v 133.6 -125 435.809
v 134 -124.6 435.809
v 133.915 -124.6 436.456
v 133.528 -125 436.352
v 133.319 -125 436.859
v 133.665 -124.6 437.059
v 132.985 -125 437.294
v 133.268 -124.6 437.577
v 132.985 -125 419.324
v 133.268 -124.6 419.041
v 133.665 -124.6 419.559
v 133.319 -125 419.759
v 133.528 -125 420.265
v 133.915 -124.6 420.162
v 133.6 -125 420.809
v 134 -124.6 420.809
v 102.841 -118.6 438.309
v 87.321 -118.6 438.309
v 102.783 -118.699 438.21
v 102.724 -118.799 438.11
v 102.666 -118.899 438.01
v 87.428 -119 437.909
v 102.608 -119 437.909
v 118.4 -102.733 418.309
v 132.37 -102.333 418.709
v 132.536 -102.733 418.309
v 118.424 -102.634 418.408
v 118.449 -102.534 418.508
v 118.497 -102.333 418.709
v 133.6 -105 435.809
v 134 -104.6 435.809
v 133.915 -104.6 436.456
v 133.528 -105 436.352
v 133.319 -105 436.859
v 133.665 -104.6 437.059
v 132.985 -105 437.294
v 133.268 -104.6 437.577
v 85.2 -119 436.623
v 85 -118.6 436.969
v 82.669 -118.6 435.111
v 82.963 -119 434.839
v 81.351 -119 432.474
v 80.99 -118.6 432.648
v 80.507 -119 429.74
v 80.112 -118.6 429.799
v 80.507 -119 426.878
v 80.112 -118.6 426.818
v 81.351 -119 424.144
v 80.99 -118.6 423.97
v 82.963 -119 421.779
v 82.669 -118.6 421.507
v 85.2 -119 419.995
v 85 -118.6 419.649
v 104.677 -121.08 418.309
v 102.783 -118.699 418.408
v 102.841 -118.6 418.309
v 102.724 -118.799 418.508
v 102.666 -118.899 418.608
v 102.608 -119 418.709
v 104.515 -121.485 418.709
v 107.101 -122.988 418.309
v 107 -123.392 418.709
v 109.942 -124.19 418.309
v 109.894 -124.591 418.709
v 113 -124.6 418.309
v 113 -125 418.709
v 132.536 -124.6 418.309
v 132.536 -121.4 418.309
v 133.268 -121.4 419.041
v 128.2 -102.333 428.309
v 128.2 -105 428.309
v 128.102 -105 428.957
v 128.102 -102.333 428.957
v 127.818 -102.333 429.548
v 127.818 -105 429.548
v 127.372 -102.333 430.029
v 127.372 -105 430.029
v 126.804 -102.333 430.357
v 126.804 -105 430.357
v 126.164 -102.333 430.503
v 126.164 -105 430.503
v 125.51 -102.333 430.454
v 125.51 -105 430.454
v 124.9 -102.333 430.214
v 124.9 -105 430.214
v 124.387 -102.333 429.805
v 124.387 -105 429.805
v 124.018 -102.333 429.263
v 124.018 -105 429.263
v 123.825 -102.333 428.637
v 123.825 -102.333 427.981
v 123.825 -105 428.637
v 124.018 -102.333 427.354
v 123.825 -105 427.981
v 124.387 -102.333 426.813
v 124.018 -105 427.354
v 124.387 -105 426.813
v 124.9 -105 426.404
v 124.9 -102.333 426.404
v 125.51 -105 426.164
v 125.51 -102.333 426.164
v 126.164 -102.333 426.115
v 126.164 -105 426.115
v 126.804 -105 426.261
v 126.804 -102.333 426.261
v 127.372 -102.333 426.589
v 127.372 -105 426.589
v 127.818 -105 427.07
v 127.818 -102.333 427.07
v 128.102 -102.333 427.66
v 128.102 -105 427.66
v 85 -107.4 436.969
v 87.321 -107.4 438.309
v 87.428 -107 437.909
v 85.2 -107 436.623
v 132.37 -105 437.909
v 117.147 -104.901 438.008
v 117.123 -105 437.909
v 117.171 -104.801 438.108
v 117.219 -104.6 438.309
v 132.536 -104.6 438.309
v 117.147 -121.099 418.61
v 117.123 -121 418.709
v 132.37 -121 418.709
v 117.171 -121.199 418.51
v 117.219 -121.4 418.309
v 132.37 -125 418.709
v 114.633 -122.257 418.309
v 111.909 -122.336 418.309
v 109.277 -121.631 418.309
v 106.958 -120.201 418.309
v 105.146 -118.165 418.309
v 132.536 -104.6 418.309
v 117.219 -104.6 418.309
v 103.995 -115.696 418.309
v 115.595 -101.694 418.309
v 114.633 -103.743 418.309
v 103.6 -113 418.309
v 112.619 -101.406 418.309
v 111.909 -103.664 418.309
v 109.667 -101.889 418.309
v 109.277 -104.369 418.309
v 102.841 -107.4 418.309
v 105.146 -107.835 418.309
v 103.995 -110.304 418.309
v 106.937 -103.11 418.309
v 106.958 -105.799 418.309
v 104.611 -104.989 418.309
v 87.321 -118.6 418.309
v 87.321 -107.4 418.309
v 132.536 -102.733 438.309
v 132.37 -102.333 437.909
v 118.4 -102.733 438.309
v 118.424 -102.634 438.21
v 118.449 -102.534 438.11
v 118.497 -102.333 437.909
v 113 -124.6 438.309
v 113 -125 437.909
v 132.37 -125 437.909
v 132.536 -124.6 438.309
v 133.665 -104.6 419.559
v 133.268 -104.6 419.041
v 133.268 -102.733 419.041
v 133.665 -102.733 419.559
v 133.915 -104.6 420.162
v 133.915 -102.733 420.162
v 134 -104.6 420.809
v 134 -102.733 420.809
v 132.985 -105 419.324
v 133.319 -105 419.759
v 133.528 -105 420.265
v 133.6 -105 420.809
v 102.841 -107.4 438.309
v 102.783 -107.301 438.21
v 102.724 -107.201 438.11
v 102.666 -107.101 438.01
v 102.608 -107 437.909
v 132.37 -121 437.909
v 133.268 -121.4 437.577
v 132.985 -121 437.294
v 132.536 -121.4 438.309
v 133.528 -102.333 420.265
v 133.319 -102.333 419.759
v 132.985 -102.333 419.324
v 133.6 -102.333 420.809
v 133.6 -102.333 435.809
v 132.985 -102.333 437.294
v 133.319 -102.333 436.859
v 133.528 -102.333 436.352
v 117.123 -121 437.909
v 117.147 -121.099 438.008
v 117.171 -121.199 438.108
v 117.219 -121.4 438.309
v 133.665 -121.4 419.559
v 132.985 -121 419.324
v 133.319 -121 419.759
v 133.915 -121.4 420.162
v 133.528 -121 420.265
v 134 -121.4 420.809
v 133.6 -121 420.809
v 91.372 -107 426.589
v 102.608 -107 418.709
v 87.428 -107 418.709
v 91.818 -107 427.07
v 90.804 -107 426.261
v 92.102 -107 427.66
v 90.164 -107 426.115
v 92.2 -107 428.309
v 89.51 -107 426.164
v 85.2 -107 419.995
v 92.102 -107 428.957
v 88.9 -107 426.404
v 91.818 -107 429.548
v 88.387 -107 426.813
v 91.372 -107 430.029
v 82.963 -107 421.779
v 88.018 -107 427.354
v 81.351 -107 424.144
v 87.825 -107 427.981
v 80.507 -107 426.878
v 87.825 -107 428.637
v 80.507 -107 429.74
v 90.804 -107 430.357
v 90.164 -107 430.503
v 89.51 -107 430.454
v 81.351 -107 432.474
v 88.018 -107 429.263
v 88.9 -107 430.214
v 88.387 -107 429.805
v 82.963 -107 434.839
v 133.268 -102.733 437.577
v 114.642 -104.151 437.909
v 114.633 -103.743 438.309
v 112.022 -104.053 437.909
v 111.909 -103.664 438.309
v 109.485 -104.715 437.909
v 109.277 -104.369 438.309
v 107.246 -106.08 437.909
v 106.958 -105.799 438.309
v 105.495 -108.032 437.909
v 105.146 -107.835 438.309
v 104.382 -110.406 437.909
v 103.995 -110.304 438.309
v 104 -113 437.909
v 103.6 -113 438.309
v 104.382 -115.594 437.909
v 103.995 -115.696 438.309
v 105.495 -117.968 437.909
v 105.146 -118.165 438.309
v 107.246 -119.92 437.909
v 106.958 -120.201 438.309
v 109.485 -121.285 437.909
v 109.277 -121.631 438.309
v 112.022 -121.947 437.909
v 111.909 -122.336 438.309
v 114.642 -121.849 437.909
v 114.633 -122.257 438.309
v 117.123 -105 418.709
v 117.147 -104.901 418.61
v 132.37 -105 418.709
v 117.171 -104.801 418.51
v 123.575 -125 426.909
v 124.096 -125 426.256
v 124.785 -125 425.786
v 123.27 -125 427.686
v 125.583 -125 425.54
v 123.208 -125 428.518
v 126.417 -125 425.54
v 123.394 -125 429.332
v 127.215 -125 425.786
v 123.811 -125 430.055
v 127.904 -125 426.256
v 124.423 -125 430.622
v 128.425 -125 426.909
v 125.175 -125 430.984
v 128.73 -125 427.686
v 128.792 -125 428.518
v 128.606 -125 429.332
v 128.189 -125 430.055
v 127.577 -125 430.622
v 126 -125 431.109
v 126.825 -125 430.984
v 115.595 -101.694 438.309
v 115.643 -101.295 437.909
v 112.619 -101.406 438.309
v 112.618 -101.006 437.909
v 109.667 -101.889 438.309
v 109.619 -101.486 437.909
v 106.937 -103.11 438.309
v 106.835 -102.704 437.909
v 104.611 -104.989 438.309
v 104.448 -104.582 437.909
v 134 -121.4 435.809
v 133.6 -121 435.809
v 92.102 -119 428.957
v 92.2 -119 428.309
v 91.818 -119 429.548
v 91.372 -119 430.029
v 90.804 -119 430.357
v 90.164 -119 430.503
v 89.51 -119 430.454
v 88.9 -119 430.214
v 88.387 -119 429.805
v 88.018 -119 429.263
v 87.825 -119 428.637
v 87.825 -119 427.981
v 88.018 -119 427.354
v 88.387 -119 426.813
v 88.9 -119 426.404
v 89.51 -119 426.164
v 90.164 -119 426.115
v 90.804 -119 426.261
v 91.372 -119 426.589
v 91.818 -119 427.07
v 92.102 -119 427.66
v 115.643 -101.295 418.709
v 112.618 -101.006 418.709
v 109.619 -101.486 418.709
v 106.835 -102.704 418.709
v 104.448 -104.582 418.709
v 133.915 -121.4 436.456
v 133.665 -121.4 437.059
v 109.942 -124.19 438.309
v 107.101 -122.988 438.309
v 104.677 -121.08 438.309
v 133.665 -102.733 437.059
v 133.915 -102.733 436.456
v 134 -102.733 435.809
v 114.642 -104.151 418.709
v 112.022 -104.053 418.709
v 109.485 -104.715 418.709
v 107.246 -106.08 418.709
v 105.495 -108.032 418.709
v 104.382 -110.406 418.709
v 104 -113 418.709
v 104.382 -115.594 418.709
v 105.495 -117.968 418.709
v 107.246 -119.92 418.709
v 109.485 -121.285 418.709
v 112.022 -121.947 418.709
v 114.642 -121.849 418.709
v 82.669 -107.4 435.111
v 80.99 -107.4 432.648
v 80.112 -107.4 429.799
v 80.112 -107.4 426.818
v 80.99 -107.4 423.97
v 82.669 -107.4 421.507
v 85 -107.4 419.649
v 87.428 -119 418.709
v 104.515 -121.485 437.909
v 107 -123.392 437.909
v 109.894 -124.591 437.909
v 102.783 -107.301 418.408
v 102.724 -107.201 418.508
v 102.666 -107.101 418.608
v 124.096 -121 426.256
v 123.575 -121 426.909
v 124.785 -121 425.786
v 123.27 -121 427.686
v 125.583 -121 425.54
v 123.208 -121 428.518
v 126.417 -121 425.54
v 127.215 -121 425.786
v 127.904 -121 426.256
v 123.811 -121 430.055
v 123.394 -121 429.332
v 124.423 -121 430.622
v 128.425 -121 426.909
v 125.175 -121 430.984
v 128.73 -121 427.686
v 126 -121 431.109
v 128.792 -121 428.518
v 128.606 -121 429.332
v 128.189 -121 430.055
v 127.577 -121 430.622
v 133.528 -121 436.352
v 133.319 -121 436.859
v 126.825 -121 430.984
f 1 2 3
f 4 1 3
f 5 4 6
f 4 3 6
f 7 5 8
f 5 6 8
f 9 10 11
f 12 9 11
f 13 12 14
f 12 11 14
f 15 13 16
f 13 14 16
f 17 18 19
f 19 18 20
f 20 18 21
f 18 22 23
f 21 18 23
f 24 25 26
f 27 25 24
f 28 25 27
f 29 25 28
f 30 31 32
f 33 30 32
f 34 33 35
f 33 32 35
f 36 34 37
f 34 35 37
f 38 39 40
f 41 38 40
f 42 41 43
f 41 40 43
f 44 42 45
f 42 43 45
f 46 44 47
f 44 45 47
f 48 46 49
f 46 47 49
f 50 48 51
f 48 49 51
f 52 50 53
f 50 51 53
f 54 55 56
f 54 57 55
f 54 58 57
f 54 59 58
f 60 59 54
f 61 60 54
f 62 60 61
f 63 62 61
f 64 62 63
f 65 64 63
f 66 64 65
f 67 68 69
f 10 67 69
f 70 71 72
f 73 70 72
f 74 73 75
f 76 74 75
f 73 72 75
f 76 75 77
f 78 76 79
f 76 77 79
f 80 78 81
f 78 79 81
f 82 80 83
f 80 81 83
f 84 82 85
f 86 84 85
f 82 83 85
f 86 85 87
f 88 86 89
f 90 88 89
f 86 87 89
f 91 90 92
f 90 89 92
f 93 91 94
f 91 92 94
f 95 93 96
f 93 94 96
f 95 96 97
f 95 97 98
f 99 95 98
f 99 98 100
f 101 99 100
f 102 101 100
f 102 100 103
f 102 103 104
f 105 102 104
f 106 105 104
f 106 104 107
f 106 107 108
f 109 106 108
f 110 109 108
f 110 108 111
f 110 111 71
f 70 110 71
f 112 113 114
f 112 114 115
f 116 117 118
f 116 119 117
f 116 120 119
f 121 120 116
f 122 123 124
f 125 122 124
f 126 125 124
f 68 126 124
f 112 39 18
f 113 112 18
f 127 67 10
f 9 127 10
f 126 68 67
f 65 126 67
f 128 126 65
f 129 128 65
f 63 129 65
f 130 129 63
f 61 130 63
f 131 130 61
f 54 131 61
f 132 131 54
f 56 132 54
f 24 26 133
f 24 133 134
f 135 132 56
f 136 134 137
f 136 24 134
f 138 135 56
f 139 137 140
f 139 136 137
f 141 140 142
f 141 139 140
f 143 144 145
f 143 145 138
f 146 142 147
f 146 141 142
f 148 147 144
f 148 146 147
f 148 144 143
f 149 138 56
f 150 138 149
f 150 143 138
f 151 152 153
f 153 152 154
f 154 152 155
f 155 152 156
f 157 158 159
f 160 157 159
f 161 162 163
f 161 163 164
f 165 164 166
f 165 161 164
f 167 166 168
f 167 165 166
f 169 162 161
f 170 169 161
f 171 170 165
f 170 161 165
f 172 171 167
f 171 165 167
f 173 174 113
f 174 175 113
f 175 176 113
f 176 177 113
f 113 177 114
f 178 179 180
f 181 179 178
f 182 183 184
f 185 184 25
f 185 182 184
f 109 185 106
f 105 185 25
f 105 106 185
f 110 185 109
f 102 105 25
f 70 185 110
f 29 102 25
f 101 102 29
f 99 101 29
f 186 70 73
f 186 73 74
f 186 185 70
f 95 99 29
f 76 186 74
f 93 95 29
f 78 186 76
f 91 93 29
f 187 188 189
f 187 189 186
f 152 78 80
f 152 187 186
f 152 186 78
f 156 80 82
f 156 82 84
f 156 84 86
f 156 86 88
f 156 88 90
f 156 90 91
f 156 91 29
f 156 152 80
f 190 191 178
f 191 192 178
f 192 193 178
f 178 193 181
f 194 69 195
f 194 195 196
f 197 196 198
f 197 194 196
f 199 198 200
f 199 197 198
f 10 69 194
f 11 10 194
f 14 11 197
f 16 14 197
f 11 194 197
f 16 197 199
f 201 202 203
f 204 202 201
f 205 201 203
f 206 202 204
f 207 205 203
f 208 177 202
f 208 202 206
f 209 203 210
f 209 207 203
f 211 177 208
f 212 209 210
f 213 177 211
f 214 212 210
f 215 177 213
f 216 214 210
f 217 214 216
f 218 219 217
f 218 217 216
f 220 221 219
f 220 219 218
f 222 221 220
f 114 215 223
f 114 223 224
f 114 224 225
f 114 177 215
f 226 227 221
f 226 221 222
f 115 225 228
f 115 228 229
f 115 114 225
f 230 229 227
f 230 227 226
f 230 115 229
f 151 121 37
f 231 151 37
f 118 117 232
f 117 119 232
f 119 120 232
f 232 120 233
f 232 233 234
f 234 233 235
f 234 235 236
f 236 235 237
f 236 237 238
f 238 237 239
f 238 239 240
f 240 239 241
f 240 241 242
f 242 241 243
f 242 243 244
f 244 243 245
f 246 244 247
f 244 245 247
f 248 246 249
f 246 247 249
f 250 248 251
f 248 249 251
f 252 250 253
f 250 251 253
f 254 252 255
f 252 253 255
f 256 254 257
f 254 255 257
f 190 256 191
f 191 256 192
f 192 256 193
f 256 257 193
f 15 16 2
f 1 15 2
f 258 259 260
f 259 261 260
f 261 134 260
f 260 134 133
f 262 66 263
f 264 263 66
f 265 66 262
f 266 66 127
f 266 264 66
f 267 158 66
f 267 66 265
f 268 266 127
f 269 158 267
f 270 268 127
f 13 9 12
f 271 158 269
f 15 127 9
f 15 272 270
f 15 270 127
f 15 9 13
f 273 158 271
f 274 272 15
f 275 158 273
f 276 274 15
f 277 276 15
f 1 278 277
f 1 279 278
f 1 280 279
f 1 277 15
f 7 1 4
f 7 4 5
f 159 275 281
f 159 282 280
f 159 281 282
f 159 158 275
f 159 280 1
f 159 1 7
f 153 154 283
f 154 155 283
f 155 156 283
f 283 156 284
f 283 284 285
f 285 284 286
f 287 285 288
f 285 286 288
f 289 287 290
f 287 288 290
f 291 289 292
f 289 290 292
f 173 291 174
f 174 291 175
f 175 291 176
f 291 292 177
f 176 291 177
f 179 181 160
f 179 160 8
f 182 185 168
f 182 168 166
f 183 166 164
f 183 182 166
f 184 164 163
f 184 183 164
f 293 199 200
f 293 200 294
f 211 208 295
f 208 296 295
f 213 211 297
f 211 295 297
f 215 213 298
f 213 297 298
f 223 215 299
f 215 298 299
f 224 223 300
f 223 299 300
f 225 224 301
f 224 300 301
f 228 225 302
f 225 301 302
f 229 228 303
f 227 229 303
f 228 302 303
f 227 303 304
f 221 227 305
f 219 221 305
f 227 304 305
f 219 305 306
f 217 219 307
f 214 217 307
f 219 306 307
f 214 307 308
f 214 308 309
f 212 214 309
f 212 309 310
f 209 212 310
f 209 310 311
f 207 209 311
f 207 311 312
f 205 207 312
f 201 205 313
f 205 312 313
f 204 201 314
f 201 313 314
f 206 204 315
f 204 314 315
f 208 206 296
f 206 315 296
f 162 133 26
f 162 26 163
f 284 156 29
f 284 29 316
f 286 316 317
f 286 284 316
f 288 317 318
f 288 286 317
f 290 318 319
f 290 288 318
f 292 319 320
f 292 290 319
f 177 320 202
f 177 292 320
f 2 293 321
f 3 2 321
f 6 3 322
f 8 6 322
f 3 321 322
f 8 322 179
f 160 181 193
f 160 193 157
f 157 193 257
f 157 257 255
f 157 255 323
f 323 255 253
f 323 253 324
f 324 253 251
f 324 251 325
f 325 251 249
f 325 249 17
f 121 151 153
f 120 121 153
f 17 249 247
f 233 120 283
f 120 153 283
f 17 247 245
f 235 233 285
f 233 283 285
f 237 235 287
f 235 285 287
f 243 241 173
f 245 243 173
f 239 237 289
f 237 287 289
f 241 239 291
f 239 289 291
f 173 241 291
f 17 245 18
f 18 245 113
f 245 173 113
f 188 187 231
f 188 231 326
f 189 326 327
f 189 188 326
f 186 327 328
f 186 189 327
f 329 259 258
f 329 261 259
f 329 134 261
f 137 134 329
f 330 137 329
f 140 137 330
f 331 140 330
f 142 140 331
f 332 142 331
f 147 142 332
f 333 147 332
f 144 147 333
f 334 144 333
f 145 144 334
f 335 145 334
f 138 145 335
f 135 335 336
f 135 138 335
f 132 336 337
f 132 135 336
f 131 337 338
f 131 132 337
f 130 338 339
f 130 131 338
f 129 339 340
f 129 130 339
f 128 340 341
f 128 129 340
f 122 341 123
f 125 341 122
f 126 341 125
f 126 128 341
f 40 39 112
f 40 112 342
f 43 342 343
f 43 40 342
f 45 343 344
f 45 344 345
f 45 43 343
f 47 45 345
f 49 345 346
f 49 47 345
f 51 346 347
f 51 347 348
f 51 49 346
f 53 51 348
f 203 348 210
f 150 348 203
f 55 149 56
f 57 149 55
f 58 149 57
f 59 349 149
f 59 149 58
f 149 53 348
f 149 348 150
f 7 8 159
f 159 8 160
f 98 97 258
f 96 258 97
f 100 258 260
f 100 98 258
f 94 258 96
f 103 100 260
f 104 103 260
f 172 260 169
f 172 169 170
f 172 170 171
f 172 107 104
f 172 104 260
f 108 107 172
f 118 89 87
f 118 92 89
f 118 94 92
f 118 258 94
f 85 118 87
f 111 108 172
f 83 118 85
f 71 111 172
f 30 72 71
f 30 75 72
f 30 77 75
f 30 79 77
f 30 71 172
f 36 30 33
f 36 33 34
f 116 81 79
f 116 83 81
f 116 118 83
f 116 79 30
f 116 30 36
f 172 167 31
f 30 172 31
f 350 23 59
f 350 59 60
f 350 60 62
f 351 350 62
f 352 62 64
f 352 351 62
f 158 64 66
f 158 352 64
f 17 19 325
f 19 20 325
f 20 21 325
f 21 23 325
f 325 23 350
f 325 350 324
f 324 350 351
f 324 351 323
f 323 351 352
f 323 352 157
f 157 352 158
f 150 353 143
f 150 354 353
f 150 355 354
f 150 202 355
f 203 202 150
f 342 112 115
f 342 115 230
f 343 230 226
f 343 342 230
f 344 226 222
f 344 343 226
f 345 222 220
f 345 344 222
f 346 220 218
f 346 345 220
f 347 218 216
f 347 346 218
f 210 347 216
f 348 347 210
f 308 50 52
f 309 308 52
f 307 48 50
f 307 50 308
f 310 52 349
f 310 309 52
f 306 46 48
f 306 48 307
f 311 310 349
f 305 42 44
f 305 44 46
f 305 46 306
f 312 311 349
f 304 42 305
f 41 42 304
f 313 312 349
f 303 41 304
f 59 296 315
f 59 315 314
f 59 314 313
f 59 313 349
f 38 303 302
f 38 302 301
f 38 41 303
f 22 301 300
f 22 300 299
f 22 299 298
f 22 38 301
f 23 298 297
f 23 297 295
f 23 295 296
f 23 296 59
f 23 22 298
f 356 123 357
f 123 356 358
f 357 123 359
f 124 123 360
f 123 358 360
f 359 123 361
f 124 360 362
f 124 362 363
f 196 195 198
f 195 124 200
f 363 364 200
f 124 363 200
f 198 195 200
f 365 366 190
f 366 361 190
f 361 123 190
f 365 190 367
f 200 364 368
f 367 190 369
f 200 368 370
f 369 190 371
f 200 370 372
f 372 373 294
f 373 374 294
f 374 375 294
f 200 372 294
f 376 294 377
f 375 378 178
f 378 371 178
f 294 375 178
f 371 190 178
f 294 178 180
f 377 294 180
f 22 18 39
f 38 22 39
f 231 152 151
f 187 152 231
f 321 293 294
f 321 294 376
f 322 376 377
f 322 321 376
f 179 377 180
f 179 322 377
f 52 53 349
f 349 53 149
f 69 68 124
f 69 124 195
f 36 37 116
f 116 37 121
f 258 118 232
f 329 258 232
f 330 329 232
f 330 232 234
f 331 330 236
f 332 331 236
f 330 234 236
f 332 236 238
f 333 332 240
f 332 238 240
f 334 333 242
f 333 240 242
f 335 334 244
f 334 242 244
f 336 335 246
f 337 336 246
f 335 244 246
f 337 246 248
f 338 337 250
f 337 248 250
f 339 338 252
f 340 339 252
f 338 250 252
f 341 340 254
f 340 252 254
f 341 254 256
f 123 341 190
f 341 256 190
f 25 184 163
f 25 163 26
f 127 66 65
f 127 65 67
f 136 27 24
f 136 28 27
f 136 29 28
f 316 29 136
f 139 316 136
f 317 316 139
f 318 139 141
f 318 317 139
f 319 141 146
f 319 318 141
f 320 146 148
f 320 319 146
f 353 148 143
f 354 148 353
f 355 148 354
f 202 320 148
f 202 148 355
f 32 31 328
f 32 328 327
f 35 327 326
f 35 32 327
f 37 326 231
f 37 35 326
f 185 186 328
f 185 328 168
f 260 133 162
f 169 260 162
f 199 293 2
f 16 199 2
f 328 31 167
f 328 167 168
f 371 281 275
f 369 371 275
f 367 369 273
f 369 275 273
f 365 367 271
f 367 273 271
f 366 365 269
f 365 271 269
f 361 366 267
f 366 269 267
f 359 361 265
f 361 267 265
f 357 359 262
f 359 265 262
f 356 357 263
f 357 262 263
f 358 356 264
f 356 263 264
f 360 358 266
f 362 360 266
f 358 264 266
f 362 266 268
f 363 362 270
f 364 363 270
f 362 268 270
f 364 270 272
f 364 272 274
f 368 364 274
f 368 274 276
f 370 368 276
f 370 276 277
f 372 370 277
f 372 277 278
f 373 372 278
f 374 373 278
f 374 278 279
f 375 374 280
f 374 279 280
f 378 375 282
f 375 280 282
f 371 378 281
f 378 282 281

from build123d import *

# Parameters (mm, degrees)
PAD048_DEPTH         = 10
SKETCH195_R          = 2.2
POCKET126_DEPTH      = 12.001
POCKET126_DEPTH_BACK = 12.001
SKETCH238_R          = 2.8
POCKET188_DEPTH      = 4
CHAMFER001_SIZE      = 0.4


with BuildPart() as part:
    # Sketch194 → Pad048 (new body, symmetric)
    with BuildSketch(Plane.XY):
        with BuildLine():
            ThreePointArc((4.123106, 8), (-9, 0), (4.123106, -8))
            Line((4.123106, -8), (21, -8))
            Line((21, -8), (21, -12))
            Line((-3.3e-05, -12), (21, -12))
            ThreePointArc((-10.392305, -6), (-6.000014, -10.392296), (-3.3e-05, -12))
            Line((-33, -6), (-10.392305, -6))
            Line((-33, 6), (-33, -6))
            Line((-10.392305, 6), (-33, 6))
            ThreePointArc((5.497474, 10.666667), (-3.381462, 11.513719), (-10.392305, 6))
            Line((21, 10.666667), (5.497474, 10.666667))
            Line((21, 8), (21, 10.666667))
            Line((4.123106, 8), (21, 8))
        make_face()
    extrude(amount=PAD048_DEPTH, both=True)

    # Sketch195 → Pocket126 (cut, two sides)
    with BuildSketch(Plane.XZ) as pocket126_sk:
        with Locations((13, 0)):
            Circle(SKETCH195_R)
        with Locations((-23, 0)):
            Circle(SKETCH195_R)
        with BuildLine():
            ThreePointArc((-28, 8.660254), (-33, 0), (-28, -8.660254))
            Line((-28, -8.660254), (-25.679492, -10))
            Line((-25.679492, -10), (-25.679492, -11))
            Line((-25.679492, -11), (-34, -11))
            Line((-34, -11), (-34, 11))
            Line((-34, 11), (-25.679492, 11))
            Line((-25.679492, 11), (-25.679492, 10))
            Line((-28, 8.660254), (-25.679492, 10))
        make_face()
        with BuildLine():
            ThreePointArc((21, 7.5), (20.809699, 8.456709), (20.267767, 9.267767))
            Line((19.535534, 10), (20.267767, 9.267767))
            Line((19.535534, 10), (19.535534, 11))
            Line((19.535534, 11), (22, 11))
            Line((22, 11), (22, -11))
            Line((22, -11), (19.535534, -11))
            Line((19.535534, -11), (19.535534, -10))
            Line((19.535534, -10), (20.267767, -9.267767))
            ThreePointArc((20.267767, -9.267767), (20.809699, -8.456709), (21, -7.5))
            Line((21, -7.5), (21, 7.5))
        make_face()
    extrude(amount=-POCKET126_DEPTH, mode=Mode.SUBTRACT)
    extrude(pocket126_sk.sketch, amount=POCKET126_DEPTH_BACK, mode=Mode.SUBTRACT)

    # Sketch238 (on DatumPlane) → Pocket188 (cut)
    with BuildSketch(Plane(origin=(13, -12, 0), x_dir=(0, 0, 1), z_dir=(0, -1, 0))):
        Circle(SKETCH238_R)
    extrude(amount=-POCKET188_DEPTH, mode=Mode.SUBTRACT)

    # Chamfer001
    chamfer001_edges = [part.edges().sort_by_distance(p)[0] for p in [
        (-18.035898, 6, 10),
        (-18.035898, -6, 10),
        (-6.000014, -10.392296, 10),
        (9.76775, -12, 10),
        (-9, 0, 10),
        (11.82932, -8, 10),
        (11.82932, 8, 10),
        (12.516504, 10.666667, 10),
        (-3.381462, 11.513719, 10),
        (12.516504, 10.666667, -10),
        (11.82932, 8, -10),
        (-3.381462, 11.513719, -10),
        (-9, 0, -10),
        (11.82932, -8, -10),
        (9.76775, -12, -10),
        (-6.000014, -10.392296, -10),
        (-18.035898, -6, -10),
        (-18.035898, 6, -10),
        (-26.839746, 6, 9.330127),
        (-31.660254, 6, 5),
        (-31.660254, 6, -5),
        (-26.839746, 6, -9.330127),
        (-26.839746, -6, 9.330127),
        (-31.660254, -6, 5),
        (-31.660254, -6, -5),
        (-26.839746, -6, -9.330127),
        (19.90165, -12, 9.633883),
        (20.809699, -12, 8.456709),
        (21, -12, 0),
        (20.809699, -12, -8.456709),
        (19.90165, -12, -9.633883),
        (19.90165, -8, 9.633883),
        (20.809699, -8, 8.456709),
        (21, -8, 0),
        (20.809699, -8, -8.456709),
        (19.90165, -8, -9.633883),
        (19.90165, 8, -9.633883),
        (19.90165, 10.666667, -9.633883),
        (20.809699, 10.666667, -8.456709),
        (20.809699, 8, -8.456709),
        (21, 10.666667, 0),
        (21, 8, 0),
        (20.809699, 10.666667, 8.456709),
        (19.90165, 10.666667, 9.633883),
        (19.90165, 8, 9.633883),
        (20.809699, 8, 8.456709),
    ]]
    chamfer(chamfer001_edges, length=CHAMFER001_SIZE)


with BuildPart() as part_1:
    # Body022042 placement: moved
    add(part.part.moved(Location((113, -113, 428.30889))))


solid = part_1.part
